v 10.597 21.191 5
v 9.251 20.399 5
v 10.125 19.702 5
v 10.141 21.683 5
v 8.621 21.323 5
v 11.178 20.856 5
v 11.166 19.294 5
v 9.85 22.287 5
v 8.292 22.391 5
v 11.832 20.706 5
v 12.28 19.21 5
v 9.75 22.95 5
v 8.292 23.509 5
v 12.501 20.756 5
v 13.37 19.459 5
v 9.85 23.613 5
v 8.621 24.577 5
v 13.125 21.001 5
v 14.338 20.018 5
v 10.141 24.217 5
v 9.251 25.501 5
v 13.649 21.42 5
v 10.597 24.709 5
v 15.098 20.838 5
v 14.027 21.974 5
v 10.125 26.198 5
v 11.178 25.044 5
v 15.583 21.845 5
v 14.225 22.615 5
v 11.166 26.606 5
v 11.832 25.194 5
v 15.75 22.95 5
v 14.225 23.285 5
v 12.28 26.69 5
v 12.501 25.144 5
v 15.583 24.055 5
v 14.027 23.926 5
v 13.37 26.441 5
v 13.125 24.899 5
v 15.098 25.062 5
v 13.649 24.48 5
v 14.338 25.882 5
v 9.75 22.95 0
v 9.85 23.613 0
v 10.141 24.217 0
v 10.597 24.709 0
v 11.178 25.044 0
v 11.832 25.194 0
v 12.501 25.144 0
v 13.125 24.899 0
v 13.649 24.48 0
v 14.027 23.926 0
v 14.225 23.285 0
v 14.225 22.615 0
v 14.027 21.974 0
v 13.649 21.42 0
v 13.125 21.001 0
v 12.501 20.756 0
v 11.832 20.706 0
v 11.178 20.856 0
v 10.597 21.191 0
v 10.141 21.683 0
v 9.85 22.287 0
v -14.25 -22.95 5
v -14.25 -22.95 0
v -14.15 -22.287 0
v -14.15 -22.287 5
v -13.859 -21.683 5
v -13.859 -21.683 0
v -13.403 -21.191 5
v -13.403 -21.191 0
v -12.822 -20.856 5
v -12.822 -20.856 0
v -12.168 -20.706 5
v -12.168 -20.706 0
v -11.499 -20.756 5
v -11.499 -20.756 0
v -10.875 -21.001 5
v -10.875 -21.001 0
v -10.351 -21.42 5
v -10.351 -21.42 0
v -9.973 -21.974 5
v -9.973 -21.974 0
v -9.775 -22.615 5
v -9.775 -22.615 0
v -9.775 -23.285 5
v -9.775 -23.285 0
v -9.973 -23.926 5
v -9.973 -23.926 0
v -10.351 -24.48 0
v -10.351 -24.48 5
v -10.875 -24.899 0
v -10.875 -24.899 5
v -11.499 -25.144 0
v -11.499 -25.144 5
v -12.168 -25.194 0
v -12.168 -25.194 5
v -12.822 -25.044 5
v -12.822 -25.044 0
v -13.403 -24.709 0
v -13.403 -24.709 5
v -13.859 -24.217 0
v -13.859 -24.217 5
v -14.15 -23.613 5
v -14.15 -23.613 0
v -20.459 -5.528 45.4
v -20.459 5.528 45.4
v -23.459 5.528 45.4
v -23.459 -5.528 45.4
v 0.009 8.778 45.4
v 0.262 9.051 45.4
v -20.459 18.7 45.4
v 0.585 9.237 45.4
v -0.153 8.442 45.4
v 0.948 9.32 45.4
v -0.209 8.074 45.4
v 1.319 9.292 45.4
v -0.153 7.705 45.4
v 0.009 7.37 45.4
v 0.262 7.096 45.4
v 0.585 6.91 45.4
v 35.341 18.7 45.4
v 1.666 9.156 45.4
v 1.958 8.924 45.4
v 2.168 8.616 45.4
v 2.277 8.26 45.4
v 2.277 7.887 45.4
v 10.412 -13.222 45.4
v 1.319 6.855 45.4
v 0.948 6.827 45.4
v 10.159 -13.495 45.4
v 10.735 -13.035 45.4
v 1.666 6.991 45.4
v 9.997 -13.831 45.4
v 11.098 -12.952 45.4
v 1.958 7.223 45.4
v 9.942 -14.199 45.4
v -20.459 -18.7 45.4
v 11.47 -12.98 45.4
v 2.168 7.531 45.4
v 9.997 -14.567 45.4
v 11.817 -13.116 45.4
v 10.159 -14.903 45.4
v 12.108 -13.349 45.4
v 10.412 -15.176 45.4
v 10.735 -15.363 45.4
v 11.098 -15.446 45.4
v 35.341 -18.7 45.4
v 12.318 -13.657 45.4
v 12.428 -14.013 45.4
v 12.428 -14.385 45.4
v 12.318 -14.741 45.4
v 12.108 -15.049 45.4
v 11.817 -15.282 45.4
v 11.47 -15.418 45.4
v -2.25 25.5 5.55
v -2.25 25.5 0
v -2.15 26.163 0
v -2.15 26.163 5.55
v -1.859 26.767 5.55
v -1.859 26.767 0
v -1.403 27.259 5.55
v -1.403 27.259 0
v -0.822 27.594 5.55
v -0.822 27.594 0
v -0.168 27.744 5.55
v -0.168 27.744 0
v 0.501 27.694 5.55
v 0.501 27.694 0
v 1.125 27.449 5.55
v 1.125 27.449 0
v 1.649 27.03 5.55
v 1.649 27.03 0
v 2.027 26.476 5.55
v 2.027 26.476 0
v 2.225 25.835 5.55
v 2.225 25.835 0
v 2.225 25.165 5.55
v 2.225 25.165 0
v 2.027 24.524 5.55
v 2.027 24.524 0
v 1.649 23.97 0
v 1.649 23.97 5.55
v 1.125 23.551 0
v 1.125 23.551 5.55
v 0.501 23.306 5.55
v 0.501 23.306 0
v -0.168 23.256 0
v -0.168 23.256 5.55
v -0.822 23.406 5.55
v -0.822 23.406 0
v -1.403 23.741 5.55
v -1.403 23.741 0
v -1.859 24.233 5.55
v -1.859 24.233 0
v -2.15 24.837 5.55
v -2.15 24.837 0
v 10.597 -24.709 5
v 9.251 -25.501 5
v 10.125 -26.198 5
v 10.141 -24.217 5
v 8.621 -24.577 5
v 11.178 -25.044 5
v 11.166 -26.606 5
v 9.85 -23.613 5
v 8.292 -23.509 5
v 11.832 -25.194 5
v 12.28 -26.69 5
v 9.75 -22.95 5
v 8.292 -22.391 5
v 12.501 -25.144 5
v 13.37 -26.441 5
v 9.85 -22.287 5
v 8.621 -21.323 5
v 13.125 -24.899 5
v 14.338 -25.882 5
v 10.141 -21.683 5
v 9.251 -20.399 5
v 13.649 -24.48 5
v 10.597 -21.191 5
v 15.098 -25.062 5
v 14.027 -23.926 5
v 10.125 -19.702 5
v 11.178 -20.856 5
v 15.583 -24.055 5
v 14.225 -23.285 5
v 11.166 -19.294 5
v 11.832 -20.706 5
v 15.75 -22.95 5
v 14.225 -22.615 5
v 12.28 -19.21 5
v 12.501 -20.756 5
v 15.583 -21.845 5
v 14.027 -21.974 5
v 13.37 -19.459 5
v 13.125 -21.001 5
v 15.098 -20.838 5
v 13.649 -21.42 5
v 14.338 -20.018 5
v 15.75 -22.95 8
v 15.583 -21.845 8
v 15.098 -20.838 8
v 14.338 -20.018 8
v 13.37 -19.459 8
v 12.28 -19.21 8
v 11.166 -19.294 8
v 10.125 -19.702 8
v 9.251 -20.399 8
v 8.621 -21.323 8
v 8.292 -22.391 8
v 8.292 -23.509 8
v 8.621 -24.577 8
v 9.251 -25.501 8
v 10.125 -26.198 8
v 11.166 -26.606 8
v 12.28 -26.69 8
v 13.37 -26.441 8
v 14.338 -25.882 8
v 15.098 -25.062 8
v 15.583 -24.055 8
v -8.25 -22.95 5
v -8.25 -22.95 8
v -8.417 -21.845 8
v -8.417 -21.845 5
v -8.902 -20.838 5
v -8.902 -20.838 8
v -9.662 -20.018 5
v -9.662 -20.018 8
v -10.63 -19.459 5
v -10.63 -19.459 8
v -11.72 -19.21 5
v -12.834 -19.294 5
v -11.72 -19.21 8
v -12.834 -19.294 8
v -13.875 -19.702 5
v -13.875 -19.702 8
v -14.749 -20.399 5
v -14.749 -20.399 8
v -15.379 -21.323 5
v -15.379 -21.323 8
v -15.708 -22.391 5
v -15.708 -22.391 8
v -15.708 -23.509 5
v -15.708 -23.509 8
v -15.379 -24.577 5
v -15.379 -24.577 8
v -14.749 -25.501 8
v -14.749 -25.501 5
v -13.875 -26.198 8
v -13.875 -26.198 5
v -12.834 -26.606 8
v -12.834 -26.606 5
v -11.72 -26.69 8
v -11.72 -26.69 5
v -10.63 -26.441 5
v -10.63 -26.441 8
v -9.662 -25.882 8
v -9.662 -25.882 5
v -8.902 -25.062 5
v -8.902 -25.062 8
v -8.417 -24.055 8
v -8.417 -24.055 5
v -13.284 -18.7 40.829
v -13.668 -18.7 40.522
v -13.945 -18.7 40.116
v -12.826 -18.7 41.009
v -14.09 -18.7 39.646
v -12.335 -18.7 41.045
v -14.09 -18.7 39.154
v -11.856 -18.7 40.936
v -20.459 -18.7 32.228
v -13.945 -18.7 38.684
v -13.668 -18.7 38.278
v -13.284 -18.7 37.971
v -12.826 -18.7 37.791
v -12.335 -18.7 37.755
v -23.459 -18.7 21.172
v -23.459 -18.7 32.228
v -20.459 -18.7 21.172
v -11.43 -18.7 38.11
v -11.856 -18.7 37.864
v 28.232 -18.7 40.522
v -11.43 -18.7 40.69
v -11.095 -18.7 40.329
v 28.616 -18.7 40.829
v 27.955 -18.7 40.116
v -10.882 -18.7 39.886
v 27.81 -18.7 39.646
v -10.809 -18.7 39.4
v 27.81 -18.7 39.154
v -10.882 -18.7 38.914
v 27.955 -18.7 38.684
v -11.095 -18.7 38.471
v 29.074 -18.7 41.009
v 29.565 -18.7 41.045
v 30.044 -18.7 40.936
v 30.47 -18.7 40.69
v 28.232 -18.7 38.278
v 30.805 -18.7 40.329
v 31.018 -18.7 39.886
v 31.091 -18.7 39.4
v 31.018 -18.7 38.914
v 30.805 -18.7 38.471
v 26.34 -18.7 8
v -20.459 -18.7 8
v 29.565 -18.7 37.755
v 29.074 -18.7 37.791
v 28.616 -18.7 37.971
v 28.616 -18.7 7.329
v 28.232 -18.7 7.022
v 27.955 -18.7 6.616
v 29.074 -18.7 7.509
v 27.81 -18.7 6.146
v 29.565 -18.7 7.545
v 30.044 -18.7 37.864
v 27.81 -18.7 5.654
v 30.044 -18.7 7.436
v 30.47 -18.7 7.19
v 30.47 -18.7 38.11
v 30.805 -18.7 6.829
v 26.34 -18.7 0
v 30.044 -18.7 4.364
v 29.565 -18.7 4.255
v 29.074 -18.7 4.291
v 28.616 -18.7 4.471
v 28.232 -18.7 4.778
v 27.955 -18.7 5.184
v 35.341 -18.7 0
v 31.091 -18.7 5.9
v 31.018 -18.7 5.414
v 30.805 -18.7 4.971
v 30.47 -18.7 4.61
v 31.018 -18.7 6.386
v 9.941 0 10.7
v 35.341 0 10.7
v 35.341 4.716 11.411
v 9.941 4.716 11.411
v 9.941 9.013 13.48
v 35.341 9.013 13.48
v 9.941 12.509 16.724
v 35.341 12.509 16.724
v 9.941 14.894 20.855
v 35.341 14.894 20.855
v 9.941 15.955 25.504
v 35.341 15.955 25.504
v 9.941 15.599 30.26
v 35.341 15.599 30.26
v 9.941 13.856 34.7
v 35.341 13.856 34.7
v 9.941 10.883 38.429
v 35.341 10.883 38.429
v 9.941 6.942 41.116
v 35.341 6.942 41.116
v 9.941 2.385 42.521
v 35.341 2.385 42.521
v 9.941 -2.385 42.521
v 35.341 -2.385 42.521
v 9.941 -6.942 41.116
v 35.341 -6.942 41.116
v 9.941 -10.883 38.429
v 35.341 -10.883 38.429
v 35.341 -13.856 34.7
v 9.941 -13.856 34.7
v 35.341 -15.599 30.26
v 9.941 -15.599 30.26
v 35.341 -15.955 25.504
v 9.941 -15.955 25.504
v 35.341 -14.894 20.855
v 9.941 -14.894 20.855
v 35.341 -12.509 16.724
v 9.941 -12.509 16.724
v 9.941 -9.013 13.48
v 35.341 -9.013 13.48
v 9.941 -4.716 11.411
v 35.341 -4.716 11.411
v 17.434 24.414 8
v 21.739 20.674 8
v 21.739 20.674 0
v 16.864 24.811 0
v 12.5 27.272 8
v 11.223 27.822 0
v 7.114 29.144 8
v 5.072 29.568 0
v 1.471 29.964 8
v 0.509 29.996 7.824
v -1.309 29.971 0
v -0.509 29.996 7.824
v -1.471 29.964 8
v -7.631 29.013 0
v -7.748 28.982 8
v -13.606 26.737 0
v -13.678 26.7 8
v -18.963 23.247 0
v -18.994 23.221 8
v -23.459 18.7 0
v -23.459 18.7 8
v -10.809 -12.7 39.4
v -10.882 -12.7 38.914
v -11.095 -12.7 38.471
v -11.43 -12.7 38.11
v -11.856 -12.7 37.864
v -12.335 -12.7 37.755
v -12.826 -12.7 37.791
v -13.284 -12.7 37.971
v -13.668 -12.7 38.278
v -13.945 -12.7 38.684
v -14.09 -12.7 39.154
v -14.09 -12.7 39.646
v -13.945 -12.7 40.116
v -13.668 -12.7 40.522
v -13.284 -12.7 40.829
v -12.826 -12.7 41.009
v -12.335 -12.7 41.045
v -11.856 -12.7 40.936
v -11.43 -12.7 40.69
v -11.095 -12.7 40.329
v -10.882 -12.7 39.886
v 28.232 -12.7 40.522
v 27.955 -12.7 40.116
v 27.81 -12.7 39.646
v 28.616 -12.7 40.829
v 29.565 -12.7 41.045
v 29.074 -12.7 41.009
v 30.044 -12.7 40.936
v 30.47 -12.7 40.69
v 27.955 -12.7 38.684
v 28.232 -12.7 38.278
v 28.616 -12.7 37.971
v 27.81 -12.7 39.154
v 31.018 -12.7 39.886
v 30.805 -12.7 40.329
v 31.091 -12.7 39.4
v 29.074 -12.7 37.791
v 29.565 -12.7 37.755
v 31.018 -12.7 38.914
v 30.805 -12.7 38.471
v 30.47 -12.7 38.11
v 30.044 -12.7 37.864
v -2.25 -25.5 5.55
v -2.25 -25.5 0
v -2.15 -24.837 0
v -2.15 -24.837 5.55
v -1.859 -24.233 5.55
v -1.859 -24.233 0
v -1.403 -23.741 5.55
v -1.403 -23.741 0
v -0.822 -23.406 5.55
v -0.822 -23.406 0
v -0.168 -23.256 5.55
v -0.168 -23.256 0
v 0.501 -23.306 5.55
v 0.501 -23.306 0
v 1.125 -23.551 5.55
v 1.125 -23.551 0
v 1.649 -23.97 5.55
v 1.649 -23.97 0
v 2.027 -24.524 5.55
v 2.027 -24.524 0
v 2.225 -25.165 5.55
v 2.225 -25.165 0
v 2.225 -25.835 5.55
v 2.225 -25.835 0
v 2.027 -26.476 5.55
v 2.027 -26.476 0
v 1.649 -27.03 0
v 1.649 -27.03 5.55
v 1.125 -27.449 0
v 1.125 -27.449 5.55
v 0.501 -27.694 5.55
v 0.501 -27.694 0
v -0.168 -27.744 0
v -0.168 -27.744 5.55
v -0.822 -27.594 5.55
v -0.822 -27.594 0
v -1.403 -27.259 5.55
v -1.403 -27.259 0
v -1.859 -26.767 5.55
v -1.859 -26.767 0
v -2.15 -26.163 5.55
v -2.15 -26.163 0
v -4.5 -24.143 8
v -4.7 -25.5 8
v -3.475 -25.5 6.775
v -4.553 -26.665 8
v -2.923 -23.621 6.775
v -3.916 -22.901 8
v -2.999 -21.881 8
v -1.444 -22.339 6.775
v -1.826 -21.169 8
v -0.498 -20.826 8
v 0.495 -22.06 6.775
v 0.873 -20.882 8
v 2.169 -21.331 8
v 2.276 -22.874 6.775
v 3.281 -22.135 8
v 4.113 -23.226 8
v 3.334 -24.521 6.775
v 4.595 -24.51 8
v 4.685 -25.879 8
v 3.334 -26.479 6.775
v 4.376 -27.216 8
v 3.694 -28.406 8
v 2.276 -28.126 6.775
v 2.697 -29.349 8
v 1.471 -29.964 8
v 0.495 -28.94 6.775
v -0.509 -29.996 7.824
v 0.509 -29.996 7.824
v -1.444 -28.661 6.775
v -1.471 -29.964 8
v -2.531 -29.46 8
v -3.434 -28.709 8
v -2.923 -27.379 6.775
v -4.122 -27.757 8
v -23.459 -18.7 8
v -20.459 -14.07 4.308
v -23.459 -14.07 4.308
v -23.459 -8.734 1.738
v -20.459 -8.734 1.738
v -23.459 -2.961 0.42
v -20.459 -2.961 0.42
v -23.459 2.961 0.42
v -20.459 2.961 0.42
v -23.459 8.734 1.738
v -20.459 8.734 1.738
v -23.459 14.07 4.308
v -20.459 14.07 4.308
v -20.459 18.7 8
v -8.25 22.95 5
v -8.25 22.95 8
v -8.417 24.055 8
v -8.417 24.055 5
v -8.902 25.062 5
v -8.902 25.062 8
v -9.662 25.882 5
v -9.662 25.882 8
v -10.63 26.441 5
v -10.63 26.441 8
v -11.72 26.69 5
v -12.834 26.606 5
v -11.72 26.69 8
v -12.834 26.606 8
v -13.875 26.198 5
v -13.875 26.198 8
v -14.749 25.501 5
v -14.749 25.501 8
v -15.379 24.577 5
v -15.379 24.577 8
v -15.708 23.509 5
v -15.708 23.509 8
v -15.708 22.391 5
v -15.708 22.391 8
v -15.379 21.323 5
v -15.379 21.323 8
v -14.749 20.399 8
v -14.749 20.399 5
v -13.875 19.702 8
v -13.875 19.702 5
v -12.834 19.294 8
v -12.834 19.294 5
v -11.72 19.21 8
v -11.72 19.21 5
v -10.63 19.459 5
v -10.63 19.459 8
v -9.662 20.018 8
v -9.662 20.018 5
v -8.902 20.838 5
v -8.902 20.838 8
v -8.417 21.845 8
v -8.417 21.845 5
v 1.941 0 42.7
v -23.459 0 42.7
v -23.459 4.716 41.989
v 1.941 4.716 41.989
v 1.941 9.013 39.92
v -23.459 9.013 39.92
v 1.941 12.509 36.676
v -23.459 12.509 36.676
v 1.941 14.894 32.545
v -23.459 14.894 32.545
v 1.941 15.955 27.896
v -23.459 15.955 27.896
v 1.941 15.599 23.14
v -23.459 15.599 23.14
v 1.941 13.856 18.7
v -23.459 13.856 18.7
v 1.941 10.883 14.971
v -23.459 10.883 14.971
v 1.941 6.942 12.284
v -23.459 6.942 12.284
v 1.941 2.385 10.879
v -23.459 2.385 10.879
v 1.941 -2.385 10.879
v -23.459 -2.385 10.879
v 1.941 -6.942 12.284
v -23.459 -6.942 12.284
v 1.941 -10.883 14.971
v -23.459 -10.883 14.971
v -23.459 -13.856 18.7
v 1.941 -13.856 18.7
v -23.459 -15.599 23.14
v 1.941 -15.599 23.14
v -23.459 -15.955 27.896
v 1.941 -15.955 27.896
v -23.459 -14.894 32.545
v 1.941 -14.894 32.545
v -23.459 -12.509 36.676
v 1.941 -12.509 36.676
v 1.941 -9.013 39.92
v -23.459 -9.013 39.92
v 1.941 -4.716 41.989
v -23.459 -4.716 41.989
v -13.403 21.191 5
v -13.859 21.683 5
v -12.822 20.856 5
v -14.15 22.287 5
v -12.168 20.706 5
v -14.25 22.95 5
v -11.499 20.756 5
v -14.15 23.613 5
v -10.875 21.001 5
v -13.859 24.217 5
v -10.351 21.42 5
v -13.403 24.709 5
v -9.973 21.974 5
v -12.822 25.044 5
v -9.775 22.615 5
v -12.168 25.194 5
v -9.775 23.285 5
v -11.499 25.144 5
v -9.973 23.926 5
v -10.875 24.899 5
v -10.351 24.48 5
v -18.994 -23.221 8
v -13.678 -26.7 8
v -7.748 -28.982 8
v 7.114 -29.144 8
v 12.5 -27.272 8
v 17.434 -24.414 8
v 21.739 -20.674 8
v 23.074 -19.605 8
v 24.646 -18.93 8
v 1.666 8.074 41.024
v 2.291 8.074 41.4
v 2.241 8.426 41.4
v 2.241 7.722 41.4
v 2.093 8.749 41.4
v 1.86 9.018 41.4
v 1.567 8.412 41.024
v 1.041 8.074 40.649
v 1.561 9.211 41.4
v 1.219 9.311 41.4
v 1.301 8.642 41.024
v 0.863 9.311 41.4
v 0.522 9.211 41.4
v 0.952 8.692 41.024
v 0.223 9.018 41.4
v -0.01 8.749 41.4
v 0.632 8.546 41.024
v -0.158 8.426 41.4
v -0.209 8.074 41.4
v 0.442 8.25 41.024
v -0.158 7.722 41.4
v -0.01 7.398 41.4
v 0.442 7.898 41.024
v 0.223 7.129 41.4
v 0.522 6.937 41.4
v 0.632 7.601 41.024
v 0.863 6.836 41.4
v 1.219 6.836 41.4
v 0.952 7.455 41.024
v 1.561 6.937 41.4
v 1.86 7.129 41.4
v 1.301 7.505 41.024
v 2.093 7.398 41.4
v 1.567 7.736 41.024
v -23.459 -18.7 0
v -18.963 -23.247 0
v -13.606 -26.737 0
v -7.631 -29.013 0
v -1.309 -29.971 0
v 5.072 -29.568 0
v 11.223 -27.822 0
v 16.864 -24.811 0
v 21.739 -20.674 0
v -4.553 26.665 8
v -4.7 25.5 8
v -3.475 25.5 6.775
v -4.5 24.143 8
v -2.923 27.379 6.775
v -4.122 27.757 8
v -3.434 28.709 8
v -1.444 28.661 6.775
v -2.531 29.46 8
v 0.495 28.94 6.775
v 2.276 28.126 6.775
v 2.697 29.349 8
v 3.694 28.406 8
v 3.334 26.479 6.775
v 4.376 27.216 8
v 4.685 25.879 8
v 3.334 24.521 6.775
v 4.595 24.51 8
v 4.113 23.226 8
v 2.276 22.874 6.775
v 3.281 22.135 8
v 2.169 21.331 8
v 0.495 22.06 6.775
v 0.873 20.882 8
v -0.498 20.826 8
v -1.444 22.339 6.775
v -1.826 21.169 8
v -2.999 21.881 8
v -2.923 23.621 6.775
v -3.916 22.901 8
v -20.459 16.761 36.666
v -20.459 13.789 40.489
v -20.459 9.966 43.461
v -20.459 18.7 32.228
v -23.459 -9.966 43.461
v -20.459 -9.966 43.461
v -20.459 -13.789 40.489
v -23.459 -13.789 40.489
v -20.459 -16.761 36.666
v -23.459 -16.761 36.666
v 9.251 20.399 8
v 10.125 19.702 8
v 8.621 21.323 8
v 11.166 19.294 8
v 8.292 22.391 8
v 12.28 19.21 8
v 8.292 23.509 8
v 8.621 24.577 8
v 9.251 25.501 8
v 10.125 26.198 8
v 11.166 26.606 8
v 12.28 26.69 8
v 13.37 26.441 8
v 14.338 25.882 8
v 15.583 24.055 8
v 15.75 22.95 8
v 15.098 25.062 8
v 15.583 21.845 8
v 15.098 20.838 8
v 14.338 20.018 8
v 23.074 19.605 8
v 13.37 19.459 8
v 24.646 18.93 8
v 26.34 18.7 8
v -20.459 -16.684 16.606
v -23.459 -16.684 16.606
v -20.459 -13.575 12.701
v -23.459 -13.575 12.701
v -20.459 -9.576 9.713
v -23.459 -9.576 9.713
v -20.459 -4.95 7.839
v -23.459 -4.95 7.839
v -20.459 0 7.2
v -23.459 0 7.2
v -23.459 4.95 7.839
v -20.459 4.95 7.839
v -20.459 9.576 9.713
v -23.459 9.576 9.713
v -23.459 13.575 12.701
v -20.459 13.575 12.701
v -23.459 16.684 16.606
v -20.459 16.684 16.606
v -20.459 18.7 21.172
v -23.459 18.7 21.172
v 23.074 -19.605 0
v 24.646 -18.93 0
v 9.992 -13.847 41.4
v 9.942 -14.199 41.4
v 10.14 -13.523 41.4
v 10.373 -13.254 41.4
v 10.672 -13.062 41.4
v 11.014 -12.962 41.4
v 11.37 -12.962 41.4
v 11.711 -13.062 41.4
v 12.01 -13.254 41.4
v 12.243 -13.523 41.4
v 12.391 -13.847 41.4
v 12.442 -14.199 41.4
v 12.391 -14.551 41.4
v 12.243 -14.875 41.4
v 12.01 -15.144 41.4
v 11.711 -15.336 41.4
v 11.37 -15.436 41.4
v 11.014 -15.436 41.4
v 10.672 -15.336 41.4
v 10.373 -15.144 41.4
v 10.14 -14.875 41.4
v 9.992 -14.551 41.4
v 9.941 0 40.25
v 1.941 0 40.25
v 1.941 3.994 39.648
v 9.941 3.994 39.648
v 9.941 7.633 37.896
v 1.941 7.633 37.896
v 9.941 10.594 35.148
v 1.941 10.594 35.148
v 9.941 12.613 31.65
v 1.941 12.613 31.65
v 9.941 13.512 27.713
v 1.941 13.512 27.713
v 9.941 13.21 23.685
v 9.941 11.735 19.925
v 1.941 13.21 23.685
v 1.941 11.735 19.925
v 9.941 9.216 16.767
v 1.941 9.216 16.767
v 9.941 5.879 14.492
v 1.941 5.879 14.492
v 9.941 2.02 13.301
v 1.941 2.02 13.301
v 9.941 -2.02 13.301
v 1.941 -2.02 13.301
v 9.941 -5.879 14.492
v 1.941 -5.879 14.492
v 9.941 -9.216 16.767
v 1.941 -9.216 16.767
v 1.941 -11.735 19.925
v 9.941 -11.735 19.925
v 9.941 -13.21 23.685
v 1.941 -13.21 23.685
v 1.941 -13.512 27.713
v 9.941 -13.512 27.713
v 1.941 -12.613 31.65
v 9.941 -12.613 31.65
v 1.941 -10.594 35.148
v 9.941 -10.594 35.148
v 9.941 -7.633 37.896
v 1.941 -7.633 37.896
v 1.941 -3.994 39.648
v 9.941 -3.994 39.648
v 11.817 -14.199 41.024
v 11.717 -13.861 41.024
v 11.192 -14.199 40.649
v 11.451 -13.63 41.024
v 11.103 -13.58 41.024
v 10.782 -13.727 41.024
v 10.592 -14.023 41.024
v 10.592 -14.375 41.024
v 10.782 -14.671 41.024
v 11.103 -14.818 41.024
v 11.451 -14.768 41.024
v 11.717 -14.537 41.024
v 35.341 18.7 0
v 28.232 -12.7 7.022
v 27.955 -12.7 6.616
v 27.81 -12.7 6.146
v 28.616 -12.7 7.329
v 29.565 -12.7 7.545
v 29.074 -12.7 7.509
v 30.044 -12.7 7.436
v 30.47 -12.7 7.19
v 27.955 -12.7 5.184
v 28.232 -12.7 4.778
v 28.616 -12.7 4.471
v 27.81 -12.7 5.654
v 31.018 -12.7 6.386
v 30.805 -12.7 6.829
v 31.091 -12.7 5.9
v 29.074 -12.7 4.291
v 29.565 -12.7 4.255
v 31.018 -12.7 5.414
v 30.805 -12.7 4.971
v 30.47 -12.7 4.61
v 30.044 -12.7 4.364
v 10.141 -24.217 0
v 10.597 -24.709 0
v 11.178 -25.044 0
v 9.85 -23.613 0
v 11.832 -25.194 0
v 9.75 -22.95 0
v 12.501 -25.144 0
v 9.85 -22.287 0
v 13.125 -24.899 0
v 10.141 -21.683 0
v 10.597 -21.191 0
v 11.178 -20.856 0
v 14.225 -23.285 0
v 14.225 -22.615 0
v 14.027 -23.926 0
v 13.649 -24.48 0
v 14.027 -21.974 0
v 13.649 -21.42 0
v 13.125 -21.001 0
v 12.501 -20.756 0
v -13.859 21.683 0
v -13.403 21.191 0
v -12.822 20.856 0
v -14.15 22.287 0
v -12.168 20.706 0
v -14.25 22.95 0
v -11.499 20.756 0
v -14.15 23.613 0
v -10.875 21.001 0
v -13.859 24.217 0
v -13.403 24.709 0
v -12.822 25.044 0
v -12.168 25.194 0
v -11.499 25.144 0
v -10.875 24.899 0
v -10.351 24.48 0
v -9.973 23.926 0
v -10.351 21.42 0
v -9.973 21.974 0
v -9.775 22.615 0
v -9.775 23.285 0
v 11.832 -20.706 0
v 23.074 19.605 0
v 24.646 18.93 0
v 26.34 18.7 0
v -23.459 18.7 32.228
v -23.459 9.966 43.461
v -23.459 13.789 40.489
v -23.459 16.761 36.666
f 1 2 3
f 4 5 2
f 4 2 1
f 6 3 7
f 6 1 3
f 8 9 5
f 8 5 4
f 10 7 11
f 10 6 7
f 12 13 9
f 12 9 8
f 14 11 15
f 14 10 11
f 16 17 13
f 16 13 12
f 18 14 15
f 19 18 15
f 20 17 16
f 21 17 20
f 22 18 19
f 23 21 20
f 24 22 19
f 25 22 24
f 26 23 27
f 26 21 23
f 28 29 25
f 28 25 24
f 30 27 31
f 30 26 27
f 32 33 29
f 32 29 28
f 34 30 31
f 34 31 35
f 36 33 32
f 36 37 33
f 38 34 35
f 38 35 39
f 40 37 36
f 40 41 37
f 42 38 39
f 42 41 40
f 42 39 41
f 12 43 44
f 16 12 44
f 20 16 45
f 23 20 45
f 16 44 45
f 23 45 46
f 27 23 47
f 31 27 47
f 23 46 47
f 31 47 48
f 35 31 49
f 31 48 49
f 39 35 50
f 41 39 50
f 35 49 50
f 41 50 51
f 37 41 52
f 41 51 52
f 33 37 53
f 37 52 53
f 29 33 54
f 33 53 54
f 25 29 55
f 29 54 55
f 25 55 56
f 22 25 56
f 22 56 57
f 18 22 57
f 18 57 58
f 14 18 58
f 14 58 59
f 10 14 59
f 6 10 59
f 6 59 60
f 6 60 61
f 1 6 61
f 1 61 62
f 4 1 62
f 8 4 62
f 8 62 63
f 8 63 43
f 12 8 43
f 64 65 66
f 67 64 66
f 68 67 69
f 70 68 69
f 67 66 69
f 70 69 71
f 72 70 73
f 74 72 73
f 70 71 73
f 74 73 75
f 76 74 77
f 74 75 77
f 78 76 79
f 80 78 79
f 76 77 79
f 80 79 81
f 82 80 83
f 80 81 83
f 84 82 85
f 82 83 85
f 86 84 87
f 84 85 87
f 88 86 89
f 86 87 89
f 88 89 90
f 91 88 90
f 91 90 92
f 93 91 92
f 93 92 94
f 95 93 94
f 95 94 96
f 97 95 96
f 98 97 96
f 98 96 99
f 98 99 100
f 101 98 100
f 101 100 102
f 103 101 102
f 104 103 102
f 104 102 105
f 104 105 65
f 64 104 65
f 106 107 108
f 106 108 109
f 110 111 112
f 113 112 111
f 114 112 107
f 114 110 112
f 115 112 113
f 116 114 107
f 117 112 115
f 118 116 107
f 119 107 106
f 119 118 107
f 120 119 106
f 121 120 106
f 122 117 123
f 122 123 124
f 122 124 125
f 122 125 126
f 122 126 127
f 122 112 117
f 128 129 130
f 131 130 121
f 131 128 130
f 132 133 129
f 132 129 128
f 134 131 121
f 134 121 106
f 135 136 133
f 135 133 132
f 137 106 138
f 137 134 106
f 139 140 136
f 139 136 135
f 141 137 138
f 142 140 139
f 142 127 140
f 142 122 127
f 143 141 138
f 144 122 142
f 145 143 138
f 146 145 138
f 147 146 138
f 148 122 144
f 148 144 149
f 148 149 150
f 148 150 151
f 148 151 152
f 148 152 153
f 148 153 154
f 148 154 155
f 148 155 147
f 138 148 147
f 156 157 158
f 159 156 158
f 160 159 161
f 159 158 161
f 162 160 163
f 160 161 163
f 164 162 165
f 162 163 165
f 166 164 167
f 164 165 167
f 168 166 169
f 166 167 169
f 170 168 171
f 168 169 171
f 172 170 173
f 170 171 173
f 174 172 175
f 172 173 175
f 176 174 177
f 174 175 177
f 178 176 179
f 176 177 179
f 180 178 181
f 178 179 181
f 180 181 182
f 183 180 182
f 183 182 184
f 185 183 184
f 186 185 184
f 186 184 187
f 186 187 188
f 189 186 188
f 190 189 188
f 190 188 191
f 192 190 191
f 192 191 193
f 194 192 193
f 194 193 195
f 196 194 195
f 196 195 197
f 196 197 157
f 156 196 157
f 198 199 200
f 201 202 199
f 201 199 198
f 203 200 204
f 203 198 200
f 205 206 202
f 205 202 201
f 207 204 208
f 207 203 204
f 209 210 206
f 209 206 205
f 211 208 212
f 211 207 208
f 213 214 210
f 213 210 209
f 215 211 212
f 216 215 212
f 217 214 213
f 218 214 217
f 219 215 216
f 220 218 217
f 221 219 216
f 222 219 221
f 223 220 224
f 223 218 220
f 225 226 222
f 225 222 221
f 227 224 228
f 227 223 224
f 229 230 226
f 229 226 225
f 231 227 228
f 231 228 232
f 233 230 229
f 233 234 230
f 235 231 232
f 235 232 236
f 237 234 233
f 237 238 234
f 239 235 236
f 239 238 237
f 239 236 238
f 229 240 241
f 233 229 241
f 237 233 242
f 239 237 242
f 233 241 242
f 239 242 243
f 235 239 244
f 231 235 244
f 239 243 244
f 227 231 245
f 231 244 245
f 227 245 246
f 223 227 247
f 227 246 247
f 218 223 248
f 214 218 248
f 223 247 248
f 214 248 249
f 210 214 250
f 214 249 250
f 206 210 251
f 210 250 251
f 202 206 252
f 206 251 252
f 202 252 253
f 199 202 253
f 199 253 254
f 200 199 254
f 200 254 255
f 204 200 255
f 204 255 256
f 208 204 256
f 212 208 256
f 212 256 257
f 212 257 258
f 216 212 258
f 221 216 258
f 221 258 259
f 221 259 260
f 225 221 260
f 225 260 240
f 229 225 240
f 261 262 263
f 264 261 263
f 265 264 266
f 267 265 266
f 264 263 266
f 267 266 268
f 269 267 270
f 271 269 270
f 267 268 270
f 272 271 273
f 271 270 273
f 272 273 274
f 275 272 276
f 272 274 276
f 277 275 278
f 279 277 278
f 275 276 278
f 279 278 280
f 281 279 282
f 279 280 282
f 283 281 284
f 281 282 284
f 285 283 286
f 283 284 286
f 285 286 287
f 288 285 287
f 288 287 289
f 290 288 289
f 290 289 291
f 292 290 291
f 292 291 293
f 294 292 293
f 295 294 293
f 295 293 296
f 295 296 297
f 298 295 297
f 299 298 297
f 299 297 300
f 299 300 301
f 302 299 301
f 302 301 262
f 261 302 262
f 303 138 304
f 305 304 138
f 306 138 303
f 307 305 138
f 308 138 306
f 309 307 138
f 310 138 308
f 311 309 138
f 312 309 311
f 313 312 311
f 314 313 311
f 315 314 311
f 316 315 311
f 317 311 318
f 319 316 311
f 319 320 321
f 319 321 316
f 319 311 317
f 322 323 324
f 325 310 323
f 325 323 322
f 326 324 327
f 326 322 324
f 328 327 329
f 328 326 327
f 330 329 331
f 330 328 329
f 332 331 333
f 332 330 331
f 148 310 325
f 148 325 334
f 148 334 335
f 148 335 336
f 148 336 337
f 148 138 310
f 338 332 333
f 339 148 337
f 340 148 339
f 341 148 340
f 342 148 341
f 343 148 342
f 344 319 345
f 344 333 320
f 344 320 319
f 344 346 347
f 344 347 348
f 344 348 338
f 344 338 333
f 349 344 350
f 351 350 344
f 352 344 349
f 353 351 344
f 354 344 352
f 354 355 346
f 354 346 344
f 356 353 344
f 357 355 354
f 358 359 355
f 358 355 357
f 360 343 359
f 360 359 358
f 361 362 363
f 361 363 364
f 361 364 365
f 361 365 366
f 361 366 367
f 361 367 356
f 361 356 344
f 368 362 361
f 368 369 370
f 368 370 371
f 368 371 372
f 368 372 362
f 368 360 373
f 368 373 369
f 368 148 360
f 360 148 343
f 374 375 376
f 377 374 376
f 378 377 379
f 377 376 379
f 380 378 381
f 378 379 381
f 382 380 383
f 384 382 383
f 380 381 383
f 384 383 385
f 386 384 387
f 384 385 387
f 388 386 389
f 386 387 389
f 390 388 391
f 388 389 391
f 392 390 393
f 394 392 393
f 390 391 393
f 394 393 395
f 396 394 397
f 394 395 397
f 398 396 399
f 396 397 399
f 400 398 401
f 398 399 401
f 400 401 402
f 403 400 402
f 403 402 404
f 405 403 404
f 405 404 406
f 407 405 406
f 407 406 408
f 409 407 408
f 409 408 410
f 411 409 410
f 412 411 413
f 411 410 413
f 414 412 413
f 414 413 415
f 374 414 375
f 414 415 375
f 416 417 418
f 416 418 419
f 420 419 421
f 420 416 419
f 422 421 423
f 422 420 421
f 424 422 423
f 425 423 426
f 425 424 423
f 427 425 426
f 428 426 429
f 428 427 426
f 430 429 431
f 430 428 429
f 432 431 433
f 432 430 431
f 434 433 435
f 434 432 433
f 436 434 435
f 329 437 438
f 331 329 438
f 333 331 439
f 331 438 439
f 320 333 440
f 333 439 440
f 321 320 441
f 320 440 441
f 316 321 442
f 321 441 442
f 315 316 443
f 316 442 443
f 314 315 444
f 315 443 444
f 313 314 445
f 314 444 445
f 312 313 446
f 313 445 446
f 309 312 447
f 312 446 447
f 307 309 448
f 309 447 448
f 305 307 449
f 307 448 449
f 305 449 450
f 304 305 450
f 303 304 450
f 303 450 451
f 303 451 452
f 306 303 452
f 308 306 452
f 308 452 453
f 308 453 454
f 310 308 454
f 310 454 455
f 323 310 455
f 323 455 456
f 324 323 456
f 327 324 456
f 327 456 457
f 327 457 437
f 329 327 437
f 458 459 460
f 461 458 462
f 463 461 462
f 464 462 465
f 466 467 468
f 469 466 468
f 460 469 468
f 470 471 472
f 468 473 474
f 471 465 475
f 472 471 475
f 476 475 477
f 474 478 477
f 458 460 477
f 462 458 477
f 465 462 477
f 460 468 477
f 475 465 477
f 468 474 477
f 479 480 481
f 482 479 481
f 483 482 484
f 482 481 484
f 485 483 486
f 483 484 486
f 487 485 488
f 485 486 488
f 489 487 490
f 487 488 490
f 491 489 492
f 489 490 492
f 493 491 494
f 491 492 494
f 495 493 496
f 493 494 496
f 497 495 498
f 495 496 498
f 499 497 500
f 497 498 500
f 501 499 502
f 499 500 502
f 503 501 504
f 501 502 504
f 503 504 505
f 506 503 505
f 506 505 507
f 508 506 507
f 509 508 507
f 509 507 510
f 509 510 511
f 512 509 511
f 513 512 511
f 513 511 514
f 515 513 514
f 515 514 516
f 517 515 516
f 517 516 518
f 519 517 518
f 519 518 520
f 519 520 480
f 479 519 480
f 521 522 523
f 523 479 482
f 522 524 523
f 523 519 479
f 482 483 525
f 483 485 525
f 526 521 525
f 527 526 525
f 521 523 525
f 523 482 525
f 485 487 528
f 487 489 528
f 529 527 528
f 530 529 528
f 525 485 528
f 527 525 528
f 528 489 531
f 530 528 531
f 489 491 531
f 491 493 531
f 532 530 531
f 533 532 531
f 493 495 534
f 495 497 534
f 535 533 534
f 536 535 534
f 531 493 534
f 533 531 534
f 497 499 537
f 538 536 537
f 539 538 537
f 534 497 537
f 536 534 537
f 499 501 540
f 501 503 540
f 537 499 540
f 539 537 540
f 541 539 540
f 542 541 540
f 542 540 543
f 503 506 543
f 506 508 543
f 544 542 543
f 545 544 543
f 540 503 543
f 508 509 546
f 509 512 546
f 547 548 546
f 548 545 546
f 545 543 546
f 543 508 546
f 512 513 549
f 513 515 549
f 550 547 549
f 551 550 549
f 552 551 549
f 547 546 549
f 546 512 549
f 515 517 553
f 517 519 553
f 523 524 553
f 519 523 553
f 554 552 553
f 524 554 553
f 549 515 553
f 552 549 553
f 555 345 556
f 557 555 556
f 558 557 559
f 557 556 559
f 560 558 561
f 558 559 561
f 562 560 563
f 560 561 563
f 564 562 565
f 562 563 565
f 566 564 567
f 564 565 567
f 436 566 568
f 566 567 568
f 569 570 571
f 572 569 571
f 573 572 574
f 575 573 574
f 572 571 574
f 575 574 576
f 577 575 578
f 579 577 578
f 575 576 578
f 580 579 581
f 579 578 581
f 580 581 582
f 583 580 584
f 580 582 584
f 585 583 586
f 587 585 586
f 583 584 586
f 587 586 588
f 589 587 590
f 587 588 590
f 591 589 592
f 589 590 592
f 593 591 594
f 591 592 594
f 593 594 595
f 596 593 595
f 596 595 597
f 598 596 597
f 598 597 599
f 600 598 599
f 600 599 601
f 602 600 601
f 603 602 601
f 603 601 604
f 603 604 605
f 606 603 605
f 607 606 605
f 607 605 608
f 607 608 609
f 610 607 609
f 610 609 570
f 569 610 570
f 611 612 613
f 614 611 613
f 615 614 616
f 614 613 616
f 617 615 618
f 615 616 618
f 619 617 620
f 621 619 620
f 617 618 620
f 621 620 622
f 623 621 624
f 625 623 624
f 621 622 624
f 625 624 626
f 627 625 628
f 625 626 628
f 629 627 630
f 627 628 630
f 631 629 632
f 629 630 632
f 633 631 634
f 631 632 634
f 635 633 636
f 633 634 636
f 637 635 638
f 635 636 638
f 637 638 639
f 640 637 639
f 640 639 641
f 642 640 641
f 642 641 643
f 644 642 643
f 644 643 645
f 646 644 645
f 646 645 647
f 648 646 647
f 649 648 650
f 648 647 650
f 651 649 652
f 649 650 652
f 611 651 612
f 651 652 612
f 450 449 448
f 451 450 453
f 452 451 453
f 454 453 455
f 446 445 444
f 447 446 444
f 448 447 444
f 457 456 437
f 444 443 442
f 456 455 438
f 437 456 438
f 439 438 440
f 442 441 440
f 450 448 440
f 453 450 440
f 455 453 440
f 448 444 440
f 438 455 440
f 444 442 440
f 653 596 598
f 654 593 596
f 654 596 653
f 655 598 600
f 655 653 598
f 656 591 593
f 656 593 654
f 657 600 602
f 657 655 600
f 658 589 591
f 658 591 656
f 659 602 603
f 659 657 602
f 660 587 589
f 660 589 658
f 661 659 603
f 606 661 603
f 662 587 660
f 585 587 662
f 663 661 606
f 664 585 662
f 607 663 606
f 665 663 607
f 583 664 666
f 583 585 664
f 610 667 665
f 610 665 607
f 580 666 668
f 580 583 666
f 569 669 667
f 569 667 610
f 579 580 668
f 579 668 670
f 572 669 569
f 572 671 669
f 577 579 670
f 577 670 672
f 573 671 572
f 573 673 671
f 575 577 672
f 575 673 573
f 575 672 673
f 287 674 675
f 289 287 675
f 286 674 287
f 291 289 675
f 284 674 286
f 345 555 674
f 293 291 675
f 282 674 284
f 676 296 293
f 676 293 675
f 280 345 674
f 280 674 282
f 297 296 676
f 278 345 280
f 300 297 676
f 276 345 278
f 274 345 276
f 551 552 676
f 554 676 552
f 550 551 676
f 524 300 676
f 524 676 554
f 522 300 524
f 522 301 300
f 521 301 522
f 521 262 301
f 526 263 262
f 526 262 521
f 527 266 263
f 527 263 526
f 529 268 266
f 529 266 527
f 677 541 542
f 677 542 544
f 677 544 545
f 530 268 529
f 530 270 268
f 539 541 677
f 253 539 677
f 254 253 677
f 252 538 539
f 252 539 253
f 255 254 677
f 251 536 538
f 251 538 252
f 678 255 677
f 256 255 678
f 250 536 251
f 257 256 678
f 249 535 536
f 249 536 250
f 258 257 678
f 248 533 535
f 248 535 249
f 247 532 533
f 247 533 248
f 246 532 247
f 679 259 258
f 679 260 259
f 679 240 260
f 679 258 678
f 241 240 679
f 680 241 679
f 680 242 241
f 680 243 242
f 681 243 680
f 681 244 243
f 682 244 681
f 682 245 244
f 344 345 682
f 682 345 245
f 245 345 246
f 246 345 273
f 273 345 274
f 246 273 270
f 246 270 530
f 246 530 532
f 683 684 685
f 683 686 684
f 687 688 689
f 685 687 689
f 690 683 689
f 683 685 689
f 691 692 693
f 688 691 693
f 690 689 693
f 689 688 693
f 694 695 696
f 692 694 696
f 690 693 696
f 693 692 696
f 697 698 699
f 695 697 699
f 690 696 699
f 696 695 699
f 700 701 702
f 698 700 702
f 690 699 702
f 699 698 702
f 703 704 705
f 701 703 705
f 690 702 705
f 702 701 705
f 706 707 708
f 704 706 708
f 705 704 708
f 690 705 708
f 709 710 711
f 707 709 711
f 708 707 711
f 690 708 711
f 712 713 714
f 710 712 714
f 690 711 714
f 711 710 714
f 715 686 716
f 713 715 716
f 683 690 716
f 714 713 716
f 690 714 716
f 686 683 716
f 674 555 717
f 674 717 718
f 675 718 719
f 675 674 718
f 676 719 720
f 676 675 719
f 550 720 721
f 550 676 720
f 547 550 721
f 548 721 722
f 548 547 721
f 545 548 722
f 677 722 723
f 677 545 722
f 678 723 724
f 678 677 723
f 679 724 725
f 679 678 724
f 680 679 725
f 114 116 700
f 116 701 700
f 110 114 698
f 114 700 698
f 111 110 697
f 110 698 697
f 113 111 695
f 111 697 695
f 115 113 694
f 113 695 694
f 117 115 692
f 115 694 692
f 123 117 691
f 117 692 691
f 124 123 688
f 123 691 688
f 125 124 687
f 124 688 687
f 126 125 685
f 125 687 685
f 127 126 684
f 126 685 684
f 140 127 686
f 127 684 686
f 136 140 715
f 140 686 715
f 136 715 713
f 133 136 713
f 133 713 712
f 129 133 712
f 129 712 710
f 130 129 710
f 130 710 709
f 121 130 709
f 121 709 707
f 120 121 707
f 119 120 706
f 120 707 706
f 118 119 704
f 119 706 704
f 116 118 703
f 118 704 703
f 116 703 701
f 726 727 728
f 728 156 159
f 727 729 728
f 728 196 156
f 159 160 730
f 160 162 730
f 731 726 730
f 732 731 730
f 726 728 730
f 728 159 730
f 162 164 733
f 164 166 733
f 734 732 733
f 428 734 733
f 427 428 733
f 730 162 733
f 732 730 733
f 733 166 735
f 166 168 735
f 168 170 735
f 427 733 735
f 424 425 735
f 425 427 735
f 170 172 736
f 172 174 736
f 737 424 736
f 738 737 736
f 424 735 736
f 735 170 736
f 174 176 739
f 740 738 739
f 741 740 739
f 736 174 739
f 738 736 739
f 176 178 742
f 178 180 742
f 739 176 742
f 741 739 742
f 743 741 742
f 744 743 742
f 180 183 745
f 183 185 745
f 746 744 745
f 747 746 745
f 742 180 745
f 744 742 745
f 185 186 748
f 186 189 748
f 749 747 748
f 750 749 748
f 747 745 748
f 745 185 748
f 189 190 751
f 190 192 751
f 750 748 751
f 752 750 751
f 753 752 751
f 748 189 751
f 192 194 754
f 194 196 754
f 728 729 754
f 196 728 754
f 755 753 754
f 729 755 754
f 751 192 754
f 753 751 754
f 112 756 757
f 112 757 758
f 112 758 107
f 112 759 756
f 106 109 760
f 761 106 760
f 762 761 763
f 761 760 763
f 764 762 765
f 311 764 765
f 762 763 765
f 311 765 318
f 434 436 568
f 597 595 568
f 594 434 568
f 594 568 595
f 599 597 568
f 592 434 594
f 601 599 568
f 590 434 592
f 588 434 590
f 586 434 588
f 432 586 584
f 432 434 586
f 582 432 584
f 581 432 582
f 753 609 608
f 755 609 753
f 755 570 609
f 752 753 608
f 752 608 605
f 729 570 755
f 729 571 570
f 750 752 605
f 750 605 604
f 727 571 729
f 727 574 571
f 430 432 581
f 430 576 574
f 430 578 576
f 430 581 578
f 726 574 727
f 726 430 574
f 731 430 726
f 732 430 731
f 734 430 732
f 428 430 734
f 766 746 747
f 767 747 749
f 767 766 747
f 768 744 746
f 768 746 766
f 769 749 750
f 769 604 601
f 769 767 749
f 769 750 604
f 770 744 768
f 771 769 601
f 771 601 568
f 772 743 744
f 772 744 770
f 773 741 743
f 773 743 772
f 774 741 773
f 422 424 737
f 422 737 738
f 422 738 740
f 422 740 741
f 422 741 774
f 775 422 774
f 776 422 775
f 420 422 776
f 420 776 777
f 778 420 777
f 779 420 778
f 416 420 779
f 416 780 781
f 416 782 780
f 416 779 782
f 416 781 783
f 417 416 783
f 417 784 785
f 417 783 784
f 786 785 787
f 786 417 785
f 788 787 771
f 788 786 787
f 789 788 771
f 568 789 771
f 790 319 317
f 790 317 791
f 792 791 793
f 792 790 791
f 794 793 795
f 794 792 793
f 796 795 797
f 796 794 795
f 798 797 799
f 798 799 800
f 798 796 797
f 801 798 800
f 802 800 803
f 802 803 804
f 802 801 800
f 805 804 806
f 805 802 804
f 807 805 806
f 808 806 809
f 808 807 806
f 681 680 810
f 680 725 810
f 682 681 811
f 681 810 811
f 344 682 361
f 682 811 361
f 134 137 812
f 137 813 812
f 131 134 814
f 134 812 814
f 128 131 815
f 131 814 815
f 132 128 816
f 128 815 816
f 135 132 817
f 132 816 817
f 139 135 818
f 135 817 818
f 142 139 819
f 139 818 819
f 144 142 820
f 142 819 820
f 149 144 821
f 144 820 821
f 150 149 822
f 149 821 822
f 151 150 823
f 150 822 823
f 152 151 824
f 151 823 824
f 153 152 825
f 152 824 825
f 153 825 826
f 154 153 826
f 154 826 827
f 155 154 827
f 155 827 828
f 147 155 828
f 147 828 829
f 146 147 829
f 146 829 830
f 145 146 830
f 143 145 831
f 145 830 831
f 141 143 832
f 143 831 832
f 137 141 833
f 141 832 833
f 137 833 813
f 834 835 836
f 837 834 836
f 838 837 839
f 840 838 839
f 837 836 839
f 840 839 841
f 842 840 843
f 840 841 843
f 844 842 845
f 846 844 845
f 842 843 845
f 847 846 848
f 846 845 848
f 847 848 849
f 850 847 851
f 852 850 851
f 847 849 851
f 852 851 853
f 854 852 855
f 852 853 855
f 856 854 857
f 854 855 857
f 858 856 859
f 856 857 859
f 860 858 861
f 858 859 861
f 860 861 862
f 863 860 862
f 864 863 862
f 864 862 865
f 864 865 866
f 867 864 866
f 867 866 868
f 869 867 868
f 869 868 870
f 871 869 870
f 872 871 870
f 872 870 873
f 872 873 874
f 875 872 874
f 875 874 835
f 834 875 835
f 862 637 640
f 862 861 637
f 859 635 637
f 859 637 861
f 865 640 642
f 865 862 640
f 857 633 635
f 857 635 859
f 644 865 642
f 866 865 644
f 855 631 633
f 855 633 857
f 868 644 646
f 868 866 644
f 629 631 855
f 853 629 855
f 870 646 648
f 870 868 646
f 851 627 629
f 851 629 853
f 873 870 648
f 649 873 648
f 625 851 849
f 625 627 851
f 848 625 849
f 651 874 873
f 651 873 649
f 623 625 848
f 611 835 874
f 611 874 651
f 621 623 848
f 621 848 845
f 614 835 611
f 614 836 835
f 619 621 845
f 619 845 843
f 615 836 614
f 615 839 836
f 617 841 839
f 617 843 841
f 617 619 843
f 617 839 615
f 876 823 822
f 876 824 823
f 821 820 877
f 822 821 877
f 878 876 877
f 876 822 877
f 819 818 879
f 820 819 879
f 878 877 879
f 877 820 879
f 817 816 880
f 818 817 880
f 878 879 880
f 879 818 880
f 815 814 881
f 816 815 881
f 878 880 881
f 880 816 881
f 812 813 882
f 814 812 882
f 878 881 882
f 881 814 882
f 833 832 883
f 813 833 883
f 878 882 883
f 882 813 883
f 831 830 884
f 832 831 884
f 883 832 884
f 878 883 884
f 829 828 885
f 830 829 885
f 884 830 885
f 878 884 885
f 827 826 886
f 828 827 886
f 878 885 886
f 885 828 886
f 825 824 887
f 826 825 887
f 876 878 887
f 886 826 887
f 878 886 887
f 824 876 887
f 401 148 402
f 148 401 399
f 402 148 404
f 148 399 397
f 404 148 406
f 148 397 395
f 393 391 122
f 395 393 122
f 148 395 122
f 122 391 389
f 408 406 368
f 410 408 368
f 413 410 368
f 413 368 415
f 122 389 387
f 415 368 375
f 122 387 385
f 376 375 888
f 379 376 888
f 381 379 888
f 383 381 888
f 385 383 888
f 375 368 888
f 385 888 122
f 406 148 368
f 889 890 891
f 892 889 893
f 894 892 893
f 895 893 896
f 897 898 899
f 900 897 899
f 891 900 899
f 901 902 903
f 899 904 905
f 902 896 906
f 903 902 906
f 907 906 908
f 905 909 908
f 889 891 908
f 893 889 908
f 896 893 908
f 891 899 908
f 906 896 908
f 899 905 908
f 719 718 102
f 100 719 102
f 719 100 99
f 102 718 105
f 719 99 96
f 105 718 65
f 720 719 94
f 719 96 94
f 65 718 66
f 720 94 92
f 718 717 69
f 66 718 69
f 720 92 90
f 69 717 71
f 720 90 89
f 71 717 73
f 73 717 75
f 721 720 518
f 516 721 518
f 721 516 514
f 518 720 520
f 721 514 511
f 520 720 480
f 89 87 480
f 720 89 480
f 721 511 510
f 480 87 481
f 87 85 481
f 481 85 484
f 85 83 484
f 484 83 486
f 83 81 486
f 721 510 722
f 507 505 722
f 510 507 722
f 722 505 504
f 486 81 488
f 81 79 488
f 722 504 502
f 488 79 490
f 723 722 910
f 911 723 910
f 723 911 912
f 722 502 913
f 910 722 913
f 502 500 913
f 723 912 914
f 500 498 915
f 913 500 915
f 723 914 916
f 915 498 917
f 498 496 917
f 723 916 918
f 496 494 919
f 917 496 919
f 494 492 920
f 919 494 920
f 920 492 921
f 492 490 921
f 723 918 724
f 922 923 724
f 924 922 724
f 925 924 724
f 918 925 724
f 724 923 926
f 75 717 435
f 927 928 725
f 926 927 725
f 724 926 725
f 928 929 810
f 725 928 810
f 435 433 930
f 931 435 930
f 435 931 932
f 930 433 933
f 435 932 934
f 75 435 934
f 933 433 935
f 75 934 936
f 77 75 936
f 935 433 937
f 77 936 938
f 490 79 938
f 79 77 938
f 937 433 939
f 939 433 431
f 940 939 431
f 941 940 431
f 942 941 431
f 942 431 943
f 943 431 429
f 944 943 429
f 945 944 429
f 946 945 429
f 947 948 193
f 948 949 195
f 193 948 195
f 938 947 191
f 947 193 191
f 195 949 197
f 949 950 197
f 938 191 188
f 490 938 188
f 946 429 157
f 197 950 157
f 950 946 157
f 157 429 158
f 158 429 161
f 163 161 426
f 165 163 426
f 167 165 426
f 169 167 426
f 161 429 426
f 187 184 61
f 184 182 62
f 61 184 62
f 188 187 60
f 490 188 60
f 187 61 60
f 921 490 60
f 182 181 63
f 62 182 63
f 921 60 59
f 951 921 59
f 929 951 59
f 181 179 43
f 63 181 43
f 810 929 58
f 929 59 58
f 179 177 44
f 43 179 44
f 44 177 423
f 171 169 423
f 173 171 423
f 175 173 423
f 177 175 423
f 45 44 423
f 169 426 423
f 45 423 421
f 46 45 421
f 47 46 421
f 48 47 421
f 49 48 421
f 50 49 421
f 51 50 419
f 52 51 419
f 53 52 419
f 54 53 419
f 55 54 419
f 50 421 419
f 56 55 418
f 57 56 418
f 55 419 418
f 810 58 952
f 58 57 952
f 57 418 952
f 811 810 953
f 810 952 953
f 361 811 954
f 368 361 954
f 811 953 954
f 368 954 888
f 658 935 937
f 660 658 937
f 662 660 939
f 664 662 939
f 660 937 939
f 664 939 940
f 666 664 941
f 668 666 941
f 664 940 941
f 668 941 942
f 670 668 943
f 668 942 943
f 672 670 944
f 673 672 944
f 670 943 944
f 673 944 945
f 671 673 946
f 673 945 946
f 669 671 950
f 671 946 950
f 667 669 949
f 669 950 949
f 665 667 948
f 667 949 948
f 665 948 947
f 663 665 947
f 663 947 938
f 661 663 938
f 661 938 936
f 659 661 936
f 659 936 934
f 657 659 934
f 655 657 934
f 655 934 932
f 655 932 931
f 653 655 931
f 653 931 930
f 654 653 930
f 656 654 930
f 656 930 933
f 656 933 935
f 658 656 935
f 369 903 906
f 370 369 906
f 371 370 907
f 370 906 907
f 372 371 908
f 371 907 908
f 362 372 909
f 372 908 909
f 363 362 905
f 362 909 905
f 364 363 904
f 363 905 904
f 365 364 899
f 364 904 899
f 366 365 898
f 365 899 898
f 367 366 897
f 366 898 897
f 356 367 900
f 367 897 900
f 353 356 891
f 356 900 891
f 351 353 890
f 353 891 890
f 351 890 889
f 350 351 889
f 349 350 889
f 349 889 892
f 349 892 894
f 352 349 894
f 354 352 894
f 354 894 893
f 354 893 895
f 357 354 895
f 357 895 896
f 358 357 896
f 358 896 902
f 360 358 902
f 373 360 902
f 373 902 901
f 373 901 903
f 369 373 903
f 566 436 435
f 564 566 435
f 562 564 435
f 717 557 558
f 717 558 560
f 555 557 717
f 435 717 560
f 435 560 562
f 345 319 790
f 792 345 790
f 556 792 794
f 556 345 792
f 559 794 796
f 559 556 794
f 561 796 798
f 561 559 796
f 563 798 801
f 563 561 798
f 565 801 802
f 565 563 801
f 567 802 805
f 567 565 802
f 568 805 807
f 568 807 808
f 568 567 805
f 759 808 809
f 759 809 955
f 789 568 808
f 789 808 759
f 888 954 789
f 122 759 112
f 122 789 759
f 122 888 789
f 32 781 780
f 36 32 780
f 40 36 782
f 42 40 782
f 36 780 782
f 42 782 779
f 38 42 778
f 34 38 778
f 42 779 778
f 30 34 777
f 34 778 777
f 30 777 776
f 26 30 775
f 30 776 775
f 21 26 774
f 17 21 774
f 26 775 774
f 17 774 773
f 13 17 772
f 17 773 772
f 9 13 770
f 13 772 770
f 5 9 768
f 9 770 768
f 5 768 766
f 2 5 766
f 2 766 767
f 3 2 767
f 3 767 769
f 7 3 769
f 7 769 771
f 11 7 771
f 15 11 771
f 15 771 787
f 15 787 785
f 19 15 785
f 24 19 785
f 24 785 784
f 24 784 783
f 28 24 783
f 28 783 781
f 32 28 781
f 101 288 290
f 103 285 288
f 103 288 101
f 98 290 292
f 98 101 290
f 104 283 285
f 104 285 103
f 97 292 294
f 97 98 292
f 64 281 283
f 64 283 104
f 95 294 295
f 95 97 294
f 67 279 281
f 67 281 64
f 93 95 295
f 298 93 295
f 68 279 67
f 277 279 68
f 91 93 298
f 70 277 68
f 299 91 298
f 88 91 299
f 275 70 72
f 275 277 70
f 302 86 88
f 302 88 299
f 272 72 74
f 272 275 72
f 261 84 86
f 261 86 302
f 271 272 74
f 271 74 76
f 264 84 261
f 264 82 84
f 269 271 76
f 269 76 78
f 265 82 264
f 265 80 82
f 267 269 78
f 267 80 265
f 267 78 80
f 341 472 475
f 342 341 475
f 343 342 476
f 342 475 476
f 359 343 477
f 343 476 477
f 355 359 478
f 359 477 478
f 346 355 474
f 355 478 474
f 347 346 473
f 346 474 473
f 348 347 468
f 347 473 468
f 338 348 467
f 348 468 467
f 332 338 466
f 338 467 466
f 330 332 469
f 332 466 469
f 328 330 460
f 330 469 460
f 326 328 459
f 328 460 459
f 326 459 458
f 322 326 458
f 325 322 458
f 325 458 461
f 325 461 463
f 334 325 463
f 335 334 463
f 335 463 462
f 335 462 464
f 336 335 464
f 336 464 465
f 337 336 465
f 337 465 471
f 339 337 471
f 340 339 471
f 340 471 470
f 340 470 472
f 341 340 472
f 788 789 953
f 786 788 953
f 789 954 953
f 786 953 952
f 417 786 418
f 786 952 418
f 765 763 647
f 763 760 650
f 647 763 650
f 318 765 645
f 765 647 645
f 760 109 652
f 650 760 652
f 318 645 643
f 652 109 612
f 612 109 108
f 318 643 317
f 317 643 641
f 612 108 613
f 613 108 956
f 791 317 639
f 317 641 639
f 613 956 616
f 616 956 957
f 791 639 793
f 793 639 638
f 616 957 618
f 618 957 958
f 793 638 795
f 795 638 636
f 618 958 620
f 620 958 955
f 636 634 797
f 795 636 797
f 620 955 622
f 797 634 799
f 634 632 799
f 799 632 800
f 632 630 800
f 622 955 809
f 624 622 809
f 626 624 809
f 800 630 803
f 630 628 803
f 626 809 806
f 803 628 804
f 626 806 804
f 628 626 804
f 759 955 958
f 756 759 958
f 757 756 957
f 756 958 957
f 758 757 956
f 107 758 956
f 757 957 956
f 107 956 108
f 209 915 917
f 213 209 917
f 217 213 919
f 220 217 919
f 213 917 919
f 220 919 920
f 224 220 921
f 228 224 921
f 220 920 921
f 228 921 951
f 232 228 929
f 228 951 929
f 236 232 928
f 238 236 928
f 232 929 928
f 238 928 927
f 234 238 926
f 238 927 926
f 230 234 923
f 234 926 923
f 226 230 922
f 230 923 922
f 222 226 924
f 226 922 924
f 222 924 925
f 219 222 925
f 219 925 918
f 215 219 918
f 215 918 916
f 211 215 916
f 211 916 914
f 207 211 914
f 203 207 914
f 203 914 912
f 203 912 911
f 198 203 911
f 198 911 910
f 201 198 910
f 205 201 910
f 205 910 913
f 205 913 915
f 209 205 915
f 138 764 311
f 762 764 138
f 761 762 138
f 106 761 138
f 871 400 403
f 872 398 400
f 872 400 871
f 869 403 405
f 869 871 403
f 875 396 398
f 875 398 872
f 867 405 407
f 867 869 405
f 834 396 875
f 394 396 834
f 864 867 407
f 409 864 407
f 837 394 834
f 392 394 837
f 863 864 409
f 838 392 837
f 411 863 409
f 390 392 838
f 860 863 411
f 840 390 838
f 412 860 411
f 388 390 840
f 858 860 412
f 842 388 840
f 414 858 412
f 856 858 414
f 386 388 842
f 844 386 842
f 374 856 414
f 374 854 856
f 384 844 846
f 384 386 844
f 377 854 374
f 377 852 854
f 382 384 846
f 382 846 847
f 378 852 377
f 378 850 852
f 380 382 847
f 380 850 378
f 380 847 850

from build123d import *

# Parameters (mm, degrees)
BOSS_EXTRUDE1_DEPTH                                 = 8
CUT_EXTRUDE1_REACH                                  = 5
SKETCH4_W                                           = 55.8
SKETCH4_H                                           = 37.4
BOSS_EXTRUDE2_DEPTH                                 = 37.4
BOSS_EXTRUDE3_DEPTH                                 = 3
CUT_EXTRUDE2_DEPTH                                  = 3
CUT_EXTRUDE3_DEPTH                                  = 3
CSK_FOR_8_FLAT_HEAD_MACHINE_SCREW_100_D             = 4.5
CSK_FOR_8_FLAT_HEAD_MACHINE_SCREW_100_DEPTH         = 8
CSK_FOR_8_FLAT_HEAD_MACHINE_SCREW_100_CSINK_D       = 9.4
CSK_FOR_8_FLAT_HEAD_MACHINE_SCREW_100_CSINK_ANGLE   = 90
F_4_CLEARANCE_HOLE1_D                               = 3.3
F_4_CLEARANCE_HOLE1_DEPTH                           = 6
CBORE_FOR_8_BINDING_HEAD_MACHINE_SCREW1_D           = 4.5
CBORE_FOR_8_BINDING_HEAD_MACHINE_SCREW1_DEPTH       = 8
CBORE_FOR_8_BINDING_HEAD_MACHINE_SCREW1_CBORE_D     = 7.5
CBORE_FOR_8_BINDING_HEAD_MACHINE_SCREW1_CBORE_DEPTH = 3
FILLET1_R                                           = 6.35
M3X0_5_TAPPED_HOLE1_D                               = 2.5
M3X0_5_TAPPED_HOLE1_DEPTH                           = 4
M3X0_5_TAPPED_HOLE1_TIP                             = 0.751075774
FILLET2_R                                           = 6.35
SKETCH_1_R                                          = 16
CUT_EXTRUDE_1_DEPTH                                 = 25.4
SKETCH_2_R                                          = 16
CUT_EXTRUDE_2_DEPTH                                 = 25.4
SKETCH_3_R                                          = 13.55
CUT_EXTRUDE_3_DEPTH                                 = 10


with BuildPart() as part:
    # Sketch1 → Boss-Extrude1 (new body)
    with BuildSketch(Plane.XY.offset(8)):
        with BuildLine():
            Line((-23.45868709, 18.7), (-23.45868709, -18.7))
            ThreePointArc((-23.45868709, -18.7), (0, -30), (23.45868709, -18.7))
            Line((23.45868709, -18.7), (35.34131291, -18.7))
            Line((35.34131291, -18.7), (35.34131291, 18.7))
            Line((35.34131291, 18.7), (23.45868709, 18.7))
            ThreePointArc((23.45868709, 18.7), (0, 30), (-23.45868709, 18.7))
        make_face()
    extrude(amount=-BOSS_EXTRUDE1_DEPTH)

    # Sketch3 → Cut-Extrude1 (cut, up to next)
    with BuildSketch(Plane(origin=(-20.45868709, 0, 0), x_dir=(0, 0, -1), z_dir=(1, 0, 0)), mode=Mode.PRIVATE) as cut_extrude1_sk1:
        with BuildLine():
            Line((-8, 18.7), (-8, -18.7))
            ThreePointArc((-8, -18.7), (-0.254206384, 0), (-8, 18.7))
        make_face()
    cut_extrude1_tool1 = extrude(cut_extrude1_sk1.sketch, amount=-CUT_EXTRUDE1_REACH, mode=Mode.PRIVATE) & part.part
    add(cut_extrude1_tool1.solids().sort_by_distance((-20.458687, 0, 4.859168))[0], mode=Mode.SUBTRACT)

    # Sketch4 → Boss-Extrude2 (add)
    with BuildSketch(Plane.XY.offset(8)):
        with Locations((7.44131291, 0)):
            Rectangle(SKETCH4_W, SKETCH4_H)
    extrude(amount=BOSS_EXTRUDE2_DEPTH)

    # Sketch5 → Boss-Extrude3 (add)
    with BuildSketch(Plane.ZY.offset(20.45868709)):
        with BuildLine():
            Line((21.171890016, 18.7), (45.4, 18.7))
            Line((45.4, 18.7), (45.4, -18.7))
            Line((45.4, -18.7), (21.171890016, -18.7))
            ThreePointArc((21.171890016, -18.7), (7.2, 0), (21.171890016, 18.7))
        make_face()
    extrude(amount=BOSS_EXTRUDE3_DEPTH)

    # Sketch6 → Cut-Extrude2 (cut)
    with BuildSketch(Plane.ZY.offset(23.45868709)):
        with BuildLine():
            Line((45.4, -18.7), (45.4, -5.528109984))
            ThreePointArc((45.4, -5.528109984), (40.488582233, -13.788582233), (32.228109984, -18.7))
            Line((32.228109984, -18.7), (45.4, -18.7))
        make_face()
    extrude(amount=-CUT_EXTRUDE2_DEPTH, mode=Mode.SUBTRACT)

    # Sketch7 → Cut-Extrude3 (cut)
    with BuildSketch(Plane.ZY.offset(23.45868709)):
        with BuildLine():
            Line((45.4, 18.7), (32.228109984, 18.7))
            ThreePointArc((32.228109984, 18.7), (40.488582233, 13.788582233), (45.4, 5.528109984))
            Line((45.4, 5.528109984), (45.4, 18.7))
        make_face()
    extrude(amount=-CUT_EXTRUDE3_DEPTH, mode=Mode.SUBTRACT)

    # Sketch8 → Cut-Revolve1 (revolve, cut)
    with BuildSketch(Plane.XY.offset(26.7)):
        Polygon((-23.45868709, 15.86865), (-23.45868709, 0), (35.34131291, 0), (35.34131291, 15.86865), (9.94131291, 15.86865), (9.94131291, 13.5), (1.94131291, 13.5), (1.94131291, 15.86865), align=None)
    revolve(axis=Axis((-23.45868709, 0, 26.7), (1, 0, 0)), mode=Mode.SUBTRACT)

    # CSK for #8 Flat Head Machine Screw (100)1
    with Locations(Plane.XY.offset(8)):
        with Locations((0, 25.5), (0, -25.5)):
            CounterSinkHole(CSK_FOR_8_FLAT_HEAD_MACHINE_SCREW_100_D / 2, CSK_FOR_8_FLAT_HEAD_MACHINE_SCREW_100_CSINK_D / 2, depth=CSK_FOR_8_FLAT_HEAD_MACHINE_SCREW_100_DEPTH, counter_sink_angle=CSK_FOR_8_FLAT_HEAD_MACHINE_SCREW_100_CSINK_ANGLE)

    # #4 Clearance Hole1
    with Locations(Plane(origin=(0, -18.7, 0), x_dir=(-1, 0, 0), z_dir=(0, -1, 0))):
        with Locations((12.45868709, -39.4), (-29.44131291, -39.4), (-29.44131291, -5.9)):
            Hole(F_4_CLEARANCE_HOLE1_D / 2, depth=F_4_CLEARANCE_HOLE1_DEPTH)

    # CBORE for #8 Binding Head Machine Screw1
    with Locations(Plane.XY.offset(8)):
        with Locations((12, 22.95), (-12, 22.95), (-12, -22.95), (12, -22.95)):
            CounterBoreHole(CBORE_FOR_8_BINDING_HEAD_MACHINE_SCREW1_D / 2, CBORE_FOR_8_BINDING_HEAD_MACHINE_SCREW1_CBORE_D / 2, CBORE_FOR_8_BINDING_HEAD_MACHINE_SCREW1_CBORE_DEPTH, depth=CBORE_FOR_8_BINDING_HEAD_MACHINE_SCREW1_DEPTH)

    # Fillet1
    fillet1_edges = [part.edges().sort_by_distance(p)[0] for p in [
        (23.45868709, 18.7, 4),
    ]]
    fillet(fillet1_edges, radius=FILLET1_R)

    # M3x0.5 Tapped Hole1
    with Locations(Plane(origin=(1.04131291, 8.07366885, 45.4), x_dir=(1, 0, 0), z_dir=(0, 0, 1))):
        with Locations((0, 0), (10.150400418, -22.272670952)):
            Hole(M3X0_5_TAPPED_HOLE1_D / 2, depth=M3X0_5_TAPPED_HOLE1_DEPTH)
            with Locations((0, 0, -(M3X0_5_TAPPED_HOLE1_DEPTH + M3X0_5_TAPPED_HOLE1_TIP / 2))):  # 118° drill point
                Cone(0, M3X0_5_TAPPED_HOLE1_D / 2, M3X0_5_TAPPED_HOLE1_TIP, mode=Mode.SUBTRACT)

    # Fillet2
    fillet2_edges = [part.edges().sort_by_distance(p)[0] for p in [
        (23.45868709, -18.7, 4),
    ]]
    fillet(fillet2_edges, radius=FILLET2_R)

    # 草图1 → 切除-拉伸1 (cut)
    with BuildSketch(Plane(origin=(35.34131291, 0, 0), x_dir=(0, 0, -1), z_dir=(1, 0, 0))):
        with Locations((-26.7, 0)):
            Circle(SKETCH_1_R)
    extrude(amount=-CUT_EXTRUDE_1_DEPTH, mode=Mode.SUBTRACT)

    # 草图2 → 切除-拉伸2 (cut)
    with BuildSketch(Plane.ZY.offset(23.45868709)):
        with Locations((26.7, 0)):
            Circle(SKETCH_2_R)
    extrude(amount=-CUT_EXTRUDE_2_DEPTH, mode=Mode.SUBTRACT)

    # 草图3 → 切除-拉伸3 (cut)
    with BuildSketch(Plane.ZY.offset(-1.94131291)):
        with Locations((26.7, 0)):
            Circle(SKETCH_3_R)
    extrude(amount=-CUT_EXTRUDE_3_DEPTH, mode=Mode.SUBTRACT)


solid = part.part
